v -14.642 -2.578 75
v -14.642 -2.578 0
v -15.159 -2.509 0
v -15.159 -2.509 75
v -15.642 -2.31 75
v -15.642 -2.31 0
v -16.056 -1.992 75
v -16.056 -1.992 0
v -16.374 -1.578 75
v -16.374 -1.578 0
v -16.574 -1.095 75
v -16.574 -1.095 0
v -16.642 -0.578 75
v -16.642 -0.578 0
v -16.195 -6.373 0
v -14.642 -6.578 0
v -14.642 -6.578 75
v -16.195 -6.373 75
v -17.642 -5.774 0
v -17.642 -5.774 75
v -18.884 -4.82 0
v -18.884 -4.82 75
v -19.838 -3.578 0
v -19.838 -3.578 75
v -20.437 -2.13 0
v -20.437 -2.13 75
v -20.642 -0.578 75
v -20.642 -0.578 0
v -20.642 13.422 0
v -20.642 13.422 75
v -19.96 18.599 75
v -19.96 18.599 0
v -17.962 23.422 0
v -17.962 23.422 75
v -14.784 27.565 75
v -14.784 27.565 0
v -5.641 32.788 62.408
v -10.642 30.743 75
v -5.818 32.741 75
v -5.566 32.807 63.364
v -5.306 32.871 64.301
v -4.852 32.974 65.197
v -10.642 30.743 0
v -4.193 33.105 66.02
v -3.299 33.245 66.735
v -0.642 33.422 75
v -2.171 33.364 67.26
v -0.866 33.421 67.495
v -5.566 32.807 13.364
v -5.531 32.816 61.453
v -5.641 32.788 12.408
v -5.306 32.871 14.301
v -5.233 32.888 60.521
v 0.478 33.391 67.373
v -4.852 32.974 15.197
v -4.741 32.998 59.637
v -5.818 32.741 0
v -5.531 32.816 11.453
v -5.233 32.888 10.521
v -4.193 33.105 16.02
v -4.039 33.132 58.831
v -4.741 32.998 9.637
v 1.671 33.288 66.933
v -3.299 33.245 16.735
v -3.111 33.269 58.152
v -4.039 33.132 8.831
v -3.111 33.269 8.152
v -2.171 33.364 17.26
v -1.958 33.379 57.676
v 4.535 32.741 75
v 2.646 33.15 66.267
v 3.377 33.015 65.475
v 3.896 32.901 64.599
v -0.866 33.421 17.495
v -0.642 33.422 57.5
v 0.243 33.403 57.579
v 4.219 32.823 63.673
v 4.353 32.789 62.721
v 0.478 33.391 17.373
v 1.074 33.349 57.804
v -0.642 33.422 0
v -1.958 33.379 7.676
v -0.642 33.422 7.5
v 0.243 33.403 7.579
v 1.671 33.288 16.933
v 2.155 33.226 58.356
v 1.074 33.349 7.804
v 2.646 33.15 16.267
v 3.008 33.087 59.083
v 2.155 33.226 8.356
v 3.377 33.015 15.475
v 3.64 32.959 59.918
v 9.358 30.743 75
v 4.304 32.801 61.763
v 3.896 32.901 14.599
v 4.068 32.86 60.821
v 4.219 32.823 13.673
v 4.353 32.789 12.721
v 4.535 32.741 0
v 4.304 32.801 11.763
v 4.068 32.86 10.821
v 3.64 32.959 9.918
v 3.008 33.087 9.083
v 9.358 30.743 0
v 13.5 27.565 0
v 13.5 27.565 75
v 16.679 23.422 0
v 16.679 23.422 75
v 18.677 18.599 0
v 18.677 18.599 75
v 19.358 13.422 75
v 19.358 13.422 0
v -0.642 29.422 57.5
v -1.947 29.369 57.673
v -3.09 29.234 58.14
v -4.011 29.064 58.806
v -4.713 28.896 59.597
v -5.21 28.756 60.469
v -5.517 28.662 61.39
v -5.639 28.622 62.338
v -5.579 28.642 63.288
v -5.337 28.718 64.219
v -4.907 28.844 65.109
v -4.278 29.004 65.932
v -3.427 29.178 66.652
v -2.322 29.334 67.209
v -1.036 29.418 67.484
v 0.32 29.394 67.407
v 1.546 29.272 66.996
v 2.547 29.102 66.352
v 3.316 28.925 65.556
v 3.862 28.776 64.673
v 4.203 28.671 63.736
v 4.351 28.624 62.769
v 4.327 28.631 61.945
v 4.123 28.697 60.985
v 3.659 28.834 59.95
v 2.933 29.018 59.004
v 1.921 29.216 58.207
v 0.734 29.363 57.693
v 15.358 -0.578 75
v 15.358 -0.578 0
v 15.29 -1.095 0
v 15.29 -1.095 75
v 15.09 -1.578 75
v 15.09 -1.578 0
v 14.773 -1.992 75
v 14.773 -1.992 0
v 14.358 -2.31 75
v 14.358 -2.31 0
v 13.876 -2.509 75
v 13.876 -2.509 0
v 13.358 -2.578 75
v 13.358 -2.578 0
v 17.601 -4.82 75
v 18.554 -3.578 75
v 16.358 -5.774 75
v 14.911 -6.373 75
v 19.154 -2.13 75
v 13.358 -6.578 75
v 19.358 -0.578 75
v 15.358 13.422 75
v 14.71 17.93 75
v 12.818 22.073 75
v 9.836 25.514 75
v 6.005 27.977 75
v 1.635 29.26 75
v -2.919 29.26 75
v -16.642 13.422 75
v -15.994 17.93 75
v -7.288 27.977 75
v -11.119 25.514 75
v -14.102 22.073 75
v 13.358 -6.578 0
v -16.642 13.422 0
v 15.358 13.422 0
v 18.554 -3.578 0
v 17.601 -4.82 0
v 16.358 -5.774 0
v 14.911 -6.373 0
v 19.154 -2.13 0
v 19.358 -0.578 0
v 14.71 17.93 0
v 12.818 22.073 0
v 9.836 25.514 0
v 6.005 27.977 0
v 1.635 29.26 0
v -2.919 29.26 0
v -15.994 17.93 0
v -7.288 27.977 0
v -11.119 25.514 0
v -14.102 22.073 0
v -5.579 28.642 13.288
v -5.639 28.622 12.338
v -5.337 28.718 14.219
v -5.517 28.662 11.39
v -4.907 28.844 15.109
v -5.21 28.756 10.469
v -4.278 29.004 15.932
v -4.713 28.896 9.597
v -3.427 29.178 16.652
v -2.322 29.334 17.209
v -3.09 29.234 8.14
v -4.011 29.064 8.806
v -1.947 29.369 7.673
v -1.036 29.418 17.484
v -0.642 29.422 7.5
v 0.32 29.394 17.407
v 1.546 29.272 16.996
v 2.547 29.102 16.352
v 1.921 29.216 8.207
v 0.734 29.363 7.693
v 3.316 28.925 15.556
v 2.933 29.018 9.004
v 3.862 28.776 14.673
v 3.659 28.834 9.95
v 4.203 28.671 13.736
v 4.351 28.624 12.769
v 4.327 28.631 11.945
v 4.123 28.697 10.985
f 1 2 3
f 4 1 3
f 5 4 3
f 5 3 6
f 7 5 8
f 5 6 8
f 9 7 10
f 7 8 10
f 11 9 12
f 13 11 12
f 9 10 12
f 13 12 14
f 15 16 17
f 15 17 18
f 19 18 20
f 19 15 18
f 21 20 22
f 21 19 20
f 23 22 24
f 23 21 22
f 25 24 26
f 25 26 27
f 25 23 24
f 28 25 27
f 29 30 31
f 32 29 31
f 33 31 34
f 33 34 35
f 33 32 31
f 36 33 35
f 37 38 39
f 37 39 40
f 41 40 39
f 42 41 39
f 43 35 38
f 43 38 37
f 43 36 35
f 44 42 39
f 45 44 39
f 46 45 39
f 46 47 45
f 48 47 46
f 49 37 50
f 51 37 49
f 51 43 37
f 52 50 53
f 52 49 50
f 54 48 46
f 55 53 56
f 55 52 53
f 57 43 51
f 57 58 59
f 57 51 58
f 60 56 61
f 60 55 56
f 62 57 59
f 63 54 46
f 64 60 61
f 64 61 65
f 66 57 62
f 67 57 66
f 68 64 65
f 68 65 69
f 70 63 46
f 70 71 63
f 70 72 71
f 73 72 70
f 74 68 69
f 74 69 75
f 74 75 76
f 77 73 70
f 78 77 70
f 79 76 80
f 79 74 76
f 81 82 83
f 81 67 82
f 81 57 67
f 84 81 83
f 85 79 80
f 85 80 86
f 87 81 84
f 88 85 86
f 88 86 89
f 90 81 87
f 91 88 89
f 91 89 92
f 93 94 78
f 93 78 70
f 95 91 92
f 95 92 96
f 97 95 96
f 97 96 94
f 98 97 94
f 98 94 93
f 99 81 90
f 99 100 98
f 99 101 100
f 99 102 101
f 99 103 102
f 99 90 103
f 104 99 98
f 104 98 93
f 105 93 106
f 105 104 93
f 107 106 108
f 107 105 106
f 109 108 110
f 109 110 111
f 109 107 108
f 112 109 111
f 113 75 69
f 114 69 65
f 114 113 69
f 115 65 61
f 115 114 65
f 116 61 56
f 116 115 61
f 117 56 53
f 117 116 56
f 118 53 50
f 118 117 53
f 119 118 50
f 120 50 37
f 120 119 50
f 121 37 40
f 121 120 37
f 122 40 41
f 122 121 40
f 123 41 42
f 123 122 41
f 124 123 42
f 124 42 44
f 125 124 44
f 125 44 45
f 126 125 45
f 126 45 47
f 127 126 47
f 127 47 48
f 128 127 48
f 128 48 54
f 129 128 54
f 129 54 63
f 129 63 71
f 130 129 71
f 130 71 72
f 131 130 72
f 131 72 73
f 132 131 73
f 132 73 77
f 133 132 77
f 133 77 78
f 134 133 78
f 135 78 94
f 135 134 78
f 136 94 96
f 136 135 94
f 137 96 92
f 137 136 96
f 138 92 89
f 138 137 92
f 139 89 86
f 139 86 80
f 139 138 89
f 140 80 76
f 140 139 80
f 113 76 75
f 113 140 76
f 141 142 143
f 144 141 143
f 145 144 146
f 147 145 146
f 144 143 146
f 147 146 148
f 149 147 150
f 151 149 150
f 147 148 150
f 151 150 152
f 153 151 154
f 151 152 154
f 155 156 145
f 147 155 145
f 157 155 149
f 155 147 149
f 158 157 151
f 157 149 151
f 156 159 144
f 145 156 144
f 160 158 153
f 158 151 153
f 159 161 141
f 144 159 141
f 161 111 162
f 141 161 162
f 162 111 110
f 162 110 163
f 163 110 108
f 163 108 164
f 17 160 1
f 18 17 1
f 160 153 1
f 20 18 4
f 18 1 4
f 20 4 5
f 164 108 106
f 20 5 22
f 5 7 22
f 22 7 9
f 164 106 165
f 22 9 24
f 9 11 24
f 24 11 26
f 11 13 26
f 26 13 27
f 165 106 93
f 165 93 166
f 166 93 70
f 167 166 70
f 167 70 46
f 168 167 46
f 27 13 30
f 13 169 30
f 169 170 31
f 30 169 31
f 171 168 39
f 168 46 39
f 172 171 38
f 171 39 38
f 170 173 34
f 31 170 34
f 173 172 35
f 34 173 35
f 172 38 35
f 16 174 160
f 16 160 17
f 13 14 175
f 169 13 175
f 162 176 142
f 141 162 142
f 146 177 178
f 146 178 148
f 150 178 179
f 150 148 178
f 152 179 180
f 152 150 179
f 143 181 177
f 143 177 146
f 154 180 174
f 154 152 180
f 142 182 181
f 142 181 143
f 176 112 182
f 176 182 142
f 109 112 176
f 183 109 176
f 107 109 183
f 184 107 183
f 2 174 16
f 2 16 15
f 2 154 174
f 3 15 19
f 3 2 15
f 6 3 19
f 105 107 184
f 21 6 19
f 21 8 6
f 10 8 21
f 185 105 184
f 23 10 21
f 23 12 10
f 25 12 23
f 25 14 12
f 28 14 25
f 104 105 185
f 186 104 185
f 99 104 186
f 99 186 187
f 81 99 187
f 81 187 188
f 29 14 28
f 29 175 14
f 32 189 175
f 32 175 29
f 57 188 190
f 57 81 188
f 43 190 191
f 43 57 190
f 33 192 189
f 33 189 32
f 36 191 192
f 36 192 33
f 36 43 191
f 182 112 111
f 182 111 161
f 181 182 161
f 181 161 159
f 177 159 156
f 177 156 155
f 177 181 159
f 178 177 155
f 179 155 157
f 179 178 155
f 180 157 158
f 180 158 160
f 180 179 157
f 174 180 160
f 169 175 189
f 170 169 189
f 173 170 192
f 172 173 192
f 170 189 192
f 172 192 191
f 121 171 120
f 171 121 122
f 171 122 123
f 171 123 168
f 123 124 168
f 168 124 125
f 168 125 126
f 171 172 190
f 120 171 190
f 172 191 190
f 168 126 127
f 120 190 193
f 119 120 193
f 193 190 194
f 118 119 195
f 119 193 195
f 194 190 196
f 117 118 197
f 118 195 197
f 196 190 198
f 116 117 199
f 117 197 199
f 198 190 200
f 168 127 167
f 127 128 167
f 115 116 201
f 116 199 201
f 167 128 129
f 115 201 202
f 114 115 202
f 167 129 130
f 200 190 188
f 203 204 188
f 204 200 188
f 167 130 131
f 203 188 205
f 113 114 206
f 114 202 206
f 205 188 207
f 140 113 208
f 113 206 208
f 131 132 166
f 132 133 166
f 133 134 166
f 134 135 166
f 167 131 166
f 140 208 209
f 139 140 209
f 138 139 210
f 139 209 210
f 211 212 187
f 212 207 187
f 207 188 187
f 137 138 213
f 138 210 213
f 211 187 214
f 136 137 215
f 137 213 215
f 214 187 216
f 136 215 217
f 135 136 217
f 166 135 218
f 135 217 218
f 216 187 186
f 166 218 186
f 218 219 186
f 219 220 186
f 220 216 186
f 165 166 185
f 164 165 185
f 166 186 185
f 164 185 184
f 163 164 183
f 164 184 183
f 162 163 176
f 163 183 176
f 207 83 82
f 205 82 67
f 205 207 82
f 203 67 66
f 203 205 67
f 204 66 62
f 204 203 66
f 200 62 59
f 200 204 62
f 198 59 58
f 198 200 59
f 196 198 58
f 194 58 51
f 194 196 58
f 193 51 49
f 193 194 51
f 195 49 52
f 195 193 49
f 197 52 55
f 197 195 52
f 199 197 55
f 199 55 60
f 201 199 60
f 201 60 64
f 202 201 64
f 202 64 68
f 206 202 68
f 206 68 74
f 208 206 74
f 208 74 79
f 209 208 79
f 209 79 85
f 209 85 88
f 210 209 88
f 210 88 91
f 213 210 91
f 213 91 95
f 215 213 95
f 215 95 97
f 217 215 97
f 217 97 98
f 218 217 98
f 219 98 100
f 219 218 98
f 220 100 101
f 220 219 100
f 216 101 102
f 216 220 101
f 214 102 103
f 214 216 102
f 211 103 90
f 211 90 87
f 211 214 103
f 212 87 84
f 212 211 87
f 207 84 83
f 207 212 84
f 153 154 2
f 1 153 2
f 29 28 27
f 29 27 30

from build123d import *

# Parameters (mm, degrees)
BOSS_EXTRU_1_DEPTH      = 75
ESQUISSE2_R             = 5
ENL_V_MAT_EXTRU_1_DEPTH = 75


with BuildPart() as part:
    # Esquisse1 → Boss.-Extru.1 (new body)
    with BuildSketch(Plane.XY):
        with BuildLine():
            Line((-20.64171123, -0.577540107), (-20.64171123, 13.422459893))
            ThreePointArc((-20.64171123, 13.422459893), (-0.64171123, 33.422459893), (19.35828877, 13.422459893))
            Line((19.35828877, 13.422459893), (19.35828877, -0.577540107))
            ThreePointArc((19.35828877, -0.577540107), (17.600929457, -4.820180794), (13.35828877, -6.577540107))
            Line((13.35828877, -6.577540107), (-14.64171123, -6.577540107))
            ThreePointArc((-14.64171123, -6.577540107), (-18.884351917, -4.820180794), (-20.64171123, -0.577540107))
        make_face()
        with BuildLine():
            Line((13.35828877, -2.577540107), (-14.64171123, -2.577540107))
            ThreePointArc((-14.64171123, -2.577540107), (-16.055924792, -1.991753669), (-16.64171123, -0.577540107))
            Line((-16.64171123, -0.577540107), (-16.64171123, 13.422459893))
            ThreePointArc((-16.64171123, 13.422459893), (-0.64171123, 29.422459893), (15.35828877, 13.422459893))
            Line((15.35828877, 13.422459893), (15.35828877, -0.577540107))
            ThreePointArc((15.35828877, -0.577540107), (14.772502332, -1.991753669), (13.35828877, -2.577540107))
        make_face(mode=Mode.SUBTRACT)
    extrude(amount=BOSS_EXTRU_1_DEPTH)

    # Esquisse2 → Enlèv. mat.-Extru.1 (cut)
    with BuildSketch(Plane(origin=(0, 0, 0), x_dir=(1, 0, 0), z_dir=(0, 1, 0))):
        with Locations(Location((-0.64171123, -12.5, 0), (0, 0, 90))):
            Circle(ESQUISSE2_R)
        with Locations(Location((-0.64171123, -62.5, 0), (0, 0, 90))):
            Circle(ESQUISSE2_R)
    extrude(amount=ENL_V_MAT_EXTRU_1_DEPTH, mode=Mode.SUBTRACT)


solid = part.part
